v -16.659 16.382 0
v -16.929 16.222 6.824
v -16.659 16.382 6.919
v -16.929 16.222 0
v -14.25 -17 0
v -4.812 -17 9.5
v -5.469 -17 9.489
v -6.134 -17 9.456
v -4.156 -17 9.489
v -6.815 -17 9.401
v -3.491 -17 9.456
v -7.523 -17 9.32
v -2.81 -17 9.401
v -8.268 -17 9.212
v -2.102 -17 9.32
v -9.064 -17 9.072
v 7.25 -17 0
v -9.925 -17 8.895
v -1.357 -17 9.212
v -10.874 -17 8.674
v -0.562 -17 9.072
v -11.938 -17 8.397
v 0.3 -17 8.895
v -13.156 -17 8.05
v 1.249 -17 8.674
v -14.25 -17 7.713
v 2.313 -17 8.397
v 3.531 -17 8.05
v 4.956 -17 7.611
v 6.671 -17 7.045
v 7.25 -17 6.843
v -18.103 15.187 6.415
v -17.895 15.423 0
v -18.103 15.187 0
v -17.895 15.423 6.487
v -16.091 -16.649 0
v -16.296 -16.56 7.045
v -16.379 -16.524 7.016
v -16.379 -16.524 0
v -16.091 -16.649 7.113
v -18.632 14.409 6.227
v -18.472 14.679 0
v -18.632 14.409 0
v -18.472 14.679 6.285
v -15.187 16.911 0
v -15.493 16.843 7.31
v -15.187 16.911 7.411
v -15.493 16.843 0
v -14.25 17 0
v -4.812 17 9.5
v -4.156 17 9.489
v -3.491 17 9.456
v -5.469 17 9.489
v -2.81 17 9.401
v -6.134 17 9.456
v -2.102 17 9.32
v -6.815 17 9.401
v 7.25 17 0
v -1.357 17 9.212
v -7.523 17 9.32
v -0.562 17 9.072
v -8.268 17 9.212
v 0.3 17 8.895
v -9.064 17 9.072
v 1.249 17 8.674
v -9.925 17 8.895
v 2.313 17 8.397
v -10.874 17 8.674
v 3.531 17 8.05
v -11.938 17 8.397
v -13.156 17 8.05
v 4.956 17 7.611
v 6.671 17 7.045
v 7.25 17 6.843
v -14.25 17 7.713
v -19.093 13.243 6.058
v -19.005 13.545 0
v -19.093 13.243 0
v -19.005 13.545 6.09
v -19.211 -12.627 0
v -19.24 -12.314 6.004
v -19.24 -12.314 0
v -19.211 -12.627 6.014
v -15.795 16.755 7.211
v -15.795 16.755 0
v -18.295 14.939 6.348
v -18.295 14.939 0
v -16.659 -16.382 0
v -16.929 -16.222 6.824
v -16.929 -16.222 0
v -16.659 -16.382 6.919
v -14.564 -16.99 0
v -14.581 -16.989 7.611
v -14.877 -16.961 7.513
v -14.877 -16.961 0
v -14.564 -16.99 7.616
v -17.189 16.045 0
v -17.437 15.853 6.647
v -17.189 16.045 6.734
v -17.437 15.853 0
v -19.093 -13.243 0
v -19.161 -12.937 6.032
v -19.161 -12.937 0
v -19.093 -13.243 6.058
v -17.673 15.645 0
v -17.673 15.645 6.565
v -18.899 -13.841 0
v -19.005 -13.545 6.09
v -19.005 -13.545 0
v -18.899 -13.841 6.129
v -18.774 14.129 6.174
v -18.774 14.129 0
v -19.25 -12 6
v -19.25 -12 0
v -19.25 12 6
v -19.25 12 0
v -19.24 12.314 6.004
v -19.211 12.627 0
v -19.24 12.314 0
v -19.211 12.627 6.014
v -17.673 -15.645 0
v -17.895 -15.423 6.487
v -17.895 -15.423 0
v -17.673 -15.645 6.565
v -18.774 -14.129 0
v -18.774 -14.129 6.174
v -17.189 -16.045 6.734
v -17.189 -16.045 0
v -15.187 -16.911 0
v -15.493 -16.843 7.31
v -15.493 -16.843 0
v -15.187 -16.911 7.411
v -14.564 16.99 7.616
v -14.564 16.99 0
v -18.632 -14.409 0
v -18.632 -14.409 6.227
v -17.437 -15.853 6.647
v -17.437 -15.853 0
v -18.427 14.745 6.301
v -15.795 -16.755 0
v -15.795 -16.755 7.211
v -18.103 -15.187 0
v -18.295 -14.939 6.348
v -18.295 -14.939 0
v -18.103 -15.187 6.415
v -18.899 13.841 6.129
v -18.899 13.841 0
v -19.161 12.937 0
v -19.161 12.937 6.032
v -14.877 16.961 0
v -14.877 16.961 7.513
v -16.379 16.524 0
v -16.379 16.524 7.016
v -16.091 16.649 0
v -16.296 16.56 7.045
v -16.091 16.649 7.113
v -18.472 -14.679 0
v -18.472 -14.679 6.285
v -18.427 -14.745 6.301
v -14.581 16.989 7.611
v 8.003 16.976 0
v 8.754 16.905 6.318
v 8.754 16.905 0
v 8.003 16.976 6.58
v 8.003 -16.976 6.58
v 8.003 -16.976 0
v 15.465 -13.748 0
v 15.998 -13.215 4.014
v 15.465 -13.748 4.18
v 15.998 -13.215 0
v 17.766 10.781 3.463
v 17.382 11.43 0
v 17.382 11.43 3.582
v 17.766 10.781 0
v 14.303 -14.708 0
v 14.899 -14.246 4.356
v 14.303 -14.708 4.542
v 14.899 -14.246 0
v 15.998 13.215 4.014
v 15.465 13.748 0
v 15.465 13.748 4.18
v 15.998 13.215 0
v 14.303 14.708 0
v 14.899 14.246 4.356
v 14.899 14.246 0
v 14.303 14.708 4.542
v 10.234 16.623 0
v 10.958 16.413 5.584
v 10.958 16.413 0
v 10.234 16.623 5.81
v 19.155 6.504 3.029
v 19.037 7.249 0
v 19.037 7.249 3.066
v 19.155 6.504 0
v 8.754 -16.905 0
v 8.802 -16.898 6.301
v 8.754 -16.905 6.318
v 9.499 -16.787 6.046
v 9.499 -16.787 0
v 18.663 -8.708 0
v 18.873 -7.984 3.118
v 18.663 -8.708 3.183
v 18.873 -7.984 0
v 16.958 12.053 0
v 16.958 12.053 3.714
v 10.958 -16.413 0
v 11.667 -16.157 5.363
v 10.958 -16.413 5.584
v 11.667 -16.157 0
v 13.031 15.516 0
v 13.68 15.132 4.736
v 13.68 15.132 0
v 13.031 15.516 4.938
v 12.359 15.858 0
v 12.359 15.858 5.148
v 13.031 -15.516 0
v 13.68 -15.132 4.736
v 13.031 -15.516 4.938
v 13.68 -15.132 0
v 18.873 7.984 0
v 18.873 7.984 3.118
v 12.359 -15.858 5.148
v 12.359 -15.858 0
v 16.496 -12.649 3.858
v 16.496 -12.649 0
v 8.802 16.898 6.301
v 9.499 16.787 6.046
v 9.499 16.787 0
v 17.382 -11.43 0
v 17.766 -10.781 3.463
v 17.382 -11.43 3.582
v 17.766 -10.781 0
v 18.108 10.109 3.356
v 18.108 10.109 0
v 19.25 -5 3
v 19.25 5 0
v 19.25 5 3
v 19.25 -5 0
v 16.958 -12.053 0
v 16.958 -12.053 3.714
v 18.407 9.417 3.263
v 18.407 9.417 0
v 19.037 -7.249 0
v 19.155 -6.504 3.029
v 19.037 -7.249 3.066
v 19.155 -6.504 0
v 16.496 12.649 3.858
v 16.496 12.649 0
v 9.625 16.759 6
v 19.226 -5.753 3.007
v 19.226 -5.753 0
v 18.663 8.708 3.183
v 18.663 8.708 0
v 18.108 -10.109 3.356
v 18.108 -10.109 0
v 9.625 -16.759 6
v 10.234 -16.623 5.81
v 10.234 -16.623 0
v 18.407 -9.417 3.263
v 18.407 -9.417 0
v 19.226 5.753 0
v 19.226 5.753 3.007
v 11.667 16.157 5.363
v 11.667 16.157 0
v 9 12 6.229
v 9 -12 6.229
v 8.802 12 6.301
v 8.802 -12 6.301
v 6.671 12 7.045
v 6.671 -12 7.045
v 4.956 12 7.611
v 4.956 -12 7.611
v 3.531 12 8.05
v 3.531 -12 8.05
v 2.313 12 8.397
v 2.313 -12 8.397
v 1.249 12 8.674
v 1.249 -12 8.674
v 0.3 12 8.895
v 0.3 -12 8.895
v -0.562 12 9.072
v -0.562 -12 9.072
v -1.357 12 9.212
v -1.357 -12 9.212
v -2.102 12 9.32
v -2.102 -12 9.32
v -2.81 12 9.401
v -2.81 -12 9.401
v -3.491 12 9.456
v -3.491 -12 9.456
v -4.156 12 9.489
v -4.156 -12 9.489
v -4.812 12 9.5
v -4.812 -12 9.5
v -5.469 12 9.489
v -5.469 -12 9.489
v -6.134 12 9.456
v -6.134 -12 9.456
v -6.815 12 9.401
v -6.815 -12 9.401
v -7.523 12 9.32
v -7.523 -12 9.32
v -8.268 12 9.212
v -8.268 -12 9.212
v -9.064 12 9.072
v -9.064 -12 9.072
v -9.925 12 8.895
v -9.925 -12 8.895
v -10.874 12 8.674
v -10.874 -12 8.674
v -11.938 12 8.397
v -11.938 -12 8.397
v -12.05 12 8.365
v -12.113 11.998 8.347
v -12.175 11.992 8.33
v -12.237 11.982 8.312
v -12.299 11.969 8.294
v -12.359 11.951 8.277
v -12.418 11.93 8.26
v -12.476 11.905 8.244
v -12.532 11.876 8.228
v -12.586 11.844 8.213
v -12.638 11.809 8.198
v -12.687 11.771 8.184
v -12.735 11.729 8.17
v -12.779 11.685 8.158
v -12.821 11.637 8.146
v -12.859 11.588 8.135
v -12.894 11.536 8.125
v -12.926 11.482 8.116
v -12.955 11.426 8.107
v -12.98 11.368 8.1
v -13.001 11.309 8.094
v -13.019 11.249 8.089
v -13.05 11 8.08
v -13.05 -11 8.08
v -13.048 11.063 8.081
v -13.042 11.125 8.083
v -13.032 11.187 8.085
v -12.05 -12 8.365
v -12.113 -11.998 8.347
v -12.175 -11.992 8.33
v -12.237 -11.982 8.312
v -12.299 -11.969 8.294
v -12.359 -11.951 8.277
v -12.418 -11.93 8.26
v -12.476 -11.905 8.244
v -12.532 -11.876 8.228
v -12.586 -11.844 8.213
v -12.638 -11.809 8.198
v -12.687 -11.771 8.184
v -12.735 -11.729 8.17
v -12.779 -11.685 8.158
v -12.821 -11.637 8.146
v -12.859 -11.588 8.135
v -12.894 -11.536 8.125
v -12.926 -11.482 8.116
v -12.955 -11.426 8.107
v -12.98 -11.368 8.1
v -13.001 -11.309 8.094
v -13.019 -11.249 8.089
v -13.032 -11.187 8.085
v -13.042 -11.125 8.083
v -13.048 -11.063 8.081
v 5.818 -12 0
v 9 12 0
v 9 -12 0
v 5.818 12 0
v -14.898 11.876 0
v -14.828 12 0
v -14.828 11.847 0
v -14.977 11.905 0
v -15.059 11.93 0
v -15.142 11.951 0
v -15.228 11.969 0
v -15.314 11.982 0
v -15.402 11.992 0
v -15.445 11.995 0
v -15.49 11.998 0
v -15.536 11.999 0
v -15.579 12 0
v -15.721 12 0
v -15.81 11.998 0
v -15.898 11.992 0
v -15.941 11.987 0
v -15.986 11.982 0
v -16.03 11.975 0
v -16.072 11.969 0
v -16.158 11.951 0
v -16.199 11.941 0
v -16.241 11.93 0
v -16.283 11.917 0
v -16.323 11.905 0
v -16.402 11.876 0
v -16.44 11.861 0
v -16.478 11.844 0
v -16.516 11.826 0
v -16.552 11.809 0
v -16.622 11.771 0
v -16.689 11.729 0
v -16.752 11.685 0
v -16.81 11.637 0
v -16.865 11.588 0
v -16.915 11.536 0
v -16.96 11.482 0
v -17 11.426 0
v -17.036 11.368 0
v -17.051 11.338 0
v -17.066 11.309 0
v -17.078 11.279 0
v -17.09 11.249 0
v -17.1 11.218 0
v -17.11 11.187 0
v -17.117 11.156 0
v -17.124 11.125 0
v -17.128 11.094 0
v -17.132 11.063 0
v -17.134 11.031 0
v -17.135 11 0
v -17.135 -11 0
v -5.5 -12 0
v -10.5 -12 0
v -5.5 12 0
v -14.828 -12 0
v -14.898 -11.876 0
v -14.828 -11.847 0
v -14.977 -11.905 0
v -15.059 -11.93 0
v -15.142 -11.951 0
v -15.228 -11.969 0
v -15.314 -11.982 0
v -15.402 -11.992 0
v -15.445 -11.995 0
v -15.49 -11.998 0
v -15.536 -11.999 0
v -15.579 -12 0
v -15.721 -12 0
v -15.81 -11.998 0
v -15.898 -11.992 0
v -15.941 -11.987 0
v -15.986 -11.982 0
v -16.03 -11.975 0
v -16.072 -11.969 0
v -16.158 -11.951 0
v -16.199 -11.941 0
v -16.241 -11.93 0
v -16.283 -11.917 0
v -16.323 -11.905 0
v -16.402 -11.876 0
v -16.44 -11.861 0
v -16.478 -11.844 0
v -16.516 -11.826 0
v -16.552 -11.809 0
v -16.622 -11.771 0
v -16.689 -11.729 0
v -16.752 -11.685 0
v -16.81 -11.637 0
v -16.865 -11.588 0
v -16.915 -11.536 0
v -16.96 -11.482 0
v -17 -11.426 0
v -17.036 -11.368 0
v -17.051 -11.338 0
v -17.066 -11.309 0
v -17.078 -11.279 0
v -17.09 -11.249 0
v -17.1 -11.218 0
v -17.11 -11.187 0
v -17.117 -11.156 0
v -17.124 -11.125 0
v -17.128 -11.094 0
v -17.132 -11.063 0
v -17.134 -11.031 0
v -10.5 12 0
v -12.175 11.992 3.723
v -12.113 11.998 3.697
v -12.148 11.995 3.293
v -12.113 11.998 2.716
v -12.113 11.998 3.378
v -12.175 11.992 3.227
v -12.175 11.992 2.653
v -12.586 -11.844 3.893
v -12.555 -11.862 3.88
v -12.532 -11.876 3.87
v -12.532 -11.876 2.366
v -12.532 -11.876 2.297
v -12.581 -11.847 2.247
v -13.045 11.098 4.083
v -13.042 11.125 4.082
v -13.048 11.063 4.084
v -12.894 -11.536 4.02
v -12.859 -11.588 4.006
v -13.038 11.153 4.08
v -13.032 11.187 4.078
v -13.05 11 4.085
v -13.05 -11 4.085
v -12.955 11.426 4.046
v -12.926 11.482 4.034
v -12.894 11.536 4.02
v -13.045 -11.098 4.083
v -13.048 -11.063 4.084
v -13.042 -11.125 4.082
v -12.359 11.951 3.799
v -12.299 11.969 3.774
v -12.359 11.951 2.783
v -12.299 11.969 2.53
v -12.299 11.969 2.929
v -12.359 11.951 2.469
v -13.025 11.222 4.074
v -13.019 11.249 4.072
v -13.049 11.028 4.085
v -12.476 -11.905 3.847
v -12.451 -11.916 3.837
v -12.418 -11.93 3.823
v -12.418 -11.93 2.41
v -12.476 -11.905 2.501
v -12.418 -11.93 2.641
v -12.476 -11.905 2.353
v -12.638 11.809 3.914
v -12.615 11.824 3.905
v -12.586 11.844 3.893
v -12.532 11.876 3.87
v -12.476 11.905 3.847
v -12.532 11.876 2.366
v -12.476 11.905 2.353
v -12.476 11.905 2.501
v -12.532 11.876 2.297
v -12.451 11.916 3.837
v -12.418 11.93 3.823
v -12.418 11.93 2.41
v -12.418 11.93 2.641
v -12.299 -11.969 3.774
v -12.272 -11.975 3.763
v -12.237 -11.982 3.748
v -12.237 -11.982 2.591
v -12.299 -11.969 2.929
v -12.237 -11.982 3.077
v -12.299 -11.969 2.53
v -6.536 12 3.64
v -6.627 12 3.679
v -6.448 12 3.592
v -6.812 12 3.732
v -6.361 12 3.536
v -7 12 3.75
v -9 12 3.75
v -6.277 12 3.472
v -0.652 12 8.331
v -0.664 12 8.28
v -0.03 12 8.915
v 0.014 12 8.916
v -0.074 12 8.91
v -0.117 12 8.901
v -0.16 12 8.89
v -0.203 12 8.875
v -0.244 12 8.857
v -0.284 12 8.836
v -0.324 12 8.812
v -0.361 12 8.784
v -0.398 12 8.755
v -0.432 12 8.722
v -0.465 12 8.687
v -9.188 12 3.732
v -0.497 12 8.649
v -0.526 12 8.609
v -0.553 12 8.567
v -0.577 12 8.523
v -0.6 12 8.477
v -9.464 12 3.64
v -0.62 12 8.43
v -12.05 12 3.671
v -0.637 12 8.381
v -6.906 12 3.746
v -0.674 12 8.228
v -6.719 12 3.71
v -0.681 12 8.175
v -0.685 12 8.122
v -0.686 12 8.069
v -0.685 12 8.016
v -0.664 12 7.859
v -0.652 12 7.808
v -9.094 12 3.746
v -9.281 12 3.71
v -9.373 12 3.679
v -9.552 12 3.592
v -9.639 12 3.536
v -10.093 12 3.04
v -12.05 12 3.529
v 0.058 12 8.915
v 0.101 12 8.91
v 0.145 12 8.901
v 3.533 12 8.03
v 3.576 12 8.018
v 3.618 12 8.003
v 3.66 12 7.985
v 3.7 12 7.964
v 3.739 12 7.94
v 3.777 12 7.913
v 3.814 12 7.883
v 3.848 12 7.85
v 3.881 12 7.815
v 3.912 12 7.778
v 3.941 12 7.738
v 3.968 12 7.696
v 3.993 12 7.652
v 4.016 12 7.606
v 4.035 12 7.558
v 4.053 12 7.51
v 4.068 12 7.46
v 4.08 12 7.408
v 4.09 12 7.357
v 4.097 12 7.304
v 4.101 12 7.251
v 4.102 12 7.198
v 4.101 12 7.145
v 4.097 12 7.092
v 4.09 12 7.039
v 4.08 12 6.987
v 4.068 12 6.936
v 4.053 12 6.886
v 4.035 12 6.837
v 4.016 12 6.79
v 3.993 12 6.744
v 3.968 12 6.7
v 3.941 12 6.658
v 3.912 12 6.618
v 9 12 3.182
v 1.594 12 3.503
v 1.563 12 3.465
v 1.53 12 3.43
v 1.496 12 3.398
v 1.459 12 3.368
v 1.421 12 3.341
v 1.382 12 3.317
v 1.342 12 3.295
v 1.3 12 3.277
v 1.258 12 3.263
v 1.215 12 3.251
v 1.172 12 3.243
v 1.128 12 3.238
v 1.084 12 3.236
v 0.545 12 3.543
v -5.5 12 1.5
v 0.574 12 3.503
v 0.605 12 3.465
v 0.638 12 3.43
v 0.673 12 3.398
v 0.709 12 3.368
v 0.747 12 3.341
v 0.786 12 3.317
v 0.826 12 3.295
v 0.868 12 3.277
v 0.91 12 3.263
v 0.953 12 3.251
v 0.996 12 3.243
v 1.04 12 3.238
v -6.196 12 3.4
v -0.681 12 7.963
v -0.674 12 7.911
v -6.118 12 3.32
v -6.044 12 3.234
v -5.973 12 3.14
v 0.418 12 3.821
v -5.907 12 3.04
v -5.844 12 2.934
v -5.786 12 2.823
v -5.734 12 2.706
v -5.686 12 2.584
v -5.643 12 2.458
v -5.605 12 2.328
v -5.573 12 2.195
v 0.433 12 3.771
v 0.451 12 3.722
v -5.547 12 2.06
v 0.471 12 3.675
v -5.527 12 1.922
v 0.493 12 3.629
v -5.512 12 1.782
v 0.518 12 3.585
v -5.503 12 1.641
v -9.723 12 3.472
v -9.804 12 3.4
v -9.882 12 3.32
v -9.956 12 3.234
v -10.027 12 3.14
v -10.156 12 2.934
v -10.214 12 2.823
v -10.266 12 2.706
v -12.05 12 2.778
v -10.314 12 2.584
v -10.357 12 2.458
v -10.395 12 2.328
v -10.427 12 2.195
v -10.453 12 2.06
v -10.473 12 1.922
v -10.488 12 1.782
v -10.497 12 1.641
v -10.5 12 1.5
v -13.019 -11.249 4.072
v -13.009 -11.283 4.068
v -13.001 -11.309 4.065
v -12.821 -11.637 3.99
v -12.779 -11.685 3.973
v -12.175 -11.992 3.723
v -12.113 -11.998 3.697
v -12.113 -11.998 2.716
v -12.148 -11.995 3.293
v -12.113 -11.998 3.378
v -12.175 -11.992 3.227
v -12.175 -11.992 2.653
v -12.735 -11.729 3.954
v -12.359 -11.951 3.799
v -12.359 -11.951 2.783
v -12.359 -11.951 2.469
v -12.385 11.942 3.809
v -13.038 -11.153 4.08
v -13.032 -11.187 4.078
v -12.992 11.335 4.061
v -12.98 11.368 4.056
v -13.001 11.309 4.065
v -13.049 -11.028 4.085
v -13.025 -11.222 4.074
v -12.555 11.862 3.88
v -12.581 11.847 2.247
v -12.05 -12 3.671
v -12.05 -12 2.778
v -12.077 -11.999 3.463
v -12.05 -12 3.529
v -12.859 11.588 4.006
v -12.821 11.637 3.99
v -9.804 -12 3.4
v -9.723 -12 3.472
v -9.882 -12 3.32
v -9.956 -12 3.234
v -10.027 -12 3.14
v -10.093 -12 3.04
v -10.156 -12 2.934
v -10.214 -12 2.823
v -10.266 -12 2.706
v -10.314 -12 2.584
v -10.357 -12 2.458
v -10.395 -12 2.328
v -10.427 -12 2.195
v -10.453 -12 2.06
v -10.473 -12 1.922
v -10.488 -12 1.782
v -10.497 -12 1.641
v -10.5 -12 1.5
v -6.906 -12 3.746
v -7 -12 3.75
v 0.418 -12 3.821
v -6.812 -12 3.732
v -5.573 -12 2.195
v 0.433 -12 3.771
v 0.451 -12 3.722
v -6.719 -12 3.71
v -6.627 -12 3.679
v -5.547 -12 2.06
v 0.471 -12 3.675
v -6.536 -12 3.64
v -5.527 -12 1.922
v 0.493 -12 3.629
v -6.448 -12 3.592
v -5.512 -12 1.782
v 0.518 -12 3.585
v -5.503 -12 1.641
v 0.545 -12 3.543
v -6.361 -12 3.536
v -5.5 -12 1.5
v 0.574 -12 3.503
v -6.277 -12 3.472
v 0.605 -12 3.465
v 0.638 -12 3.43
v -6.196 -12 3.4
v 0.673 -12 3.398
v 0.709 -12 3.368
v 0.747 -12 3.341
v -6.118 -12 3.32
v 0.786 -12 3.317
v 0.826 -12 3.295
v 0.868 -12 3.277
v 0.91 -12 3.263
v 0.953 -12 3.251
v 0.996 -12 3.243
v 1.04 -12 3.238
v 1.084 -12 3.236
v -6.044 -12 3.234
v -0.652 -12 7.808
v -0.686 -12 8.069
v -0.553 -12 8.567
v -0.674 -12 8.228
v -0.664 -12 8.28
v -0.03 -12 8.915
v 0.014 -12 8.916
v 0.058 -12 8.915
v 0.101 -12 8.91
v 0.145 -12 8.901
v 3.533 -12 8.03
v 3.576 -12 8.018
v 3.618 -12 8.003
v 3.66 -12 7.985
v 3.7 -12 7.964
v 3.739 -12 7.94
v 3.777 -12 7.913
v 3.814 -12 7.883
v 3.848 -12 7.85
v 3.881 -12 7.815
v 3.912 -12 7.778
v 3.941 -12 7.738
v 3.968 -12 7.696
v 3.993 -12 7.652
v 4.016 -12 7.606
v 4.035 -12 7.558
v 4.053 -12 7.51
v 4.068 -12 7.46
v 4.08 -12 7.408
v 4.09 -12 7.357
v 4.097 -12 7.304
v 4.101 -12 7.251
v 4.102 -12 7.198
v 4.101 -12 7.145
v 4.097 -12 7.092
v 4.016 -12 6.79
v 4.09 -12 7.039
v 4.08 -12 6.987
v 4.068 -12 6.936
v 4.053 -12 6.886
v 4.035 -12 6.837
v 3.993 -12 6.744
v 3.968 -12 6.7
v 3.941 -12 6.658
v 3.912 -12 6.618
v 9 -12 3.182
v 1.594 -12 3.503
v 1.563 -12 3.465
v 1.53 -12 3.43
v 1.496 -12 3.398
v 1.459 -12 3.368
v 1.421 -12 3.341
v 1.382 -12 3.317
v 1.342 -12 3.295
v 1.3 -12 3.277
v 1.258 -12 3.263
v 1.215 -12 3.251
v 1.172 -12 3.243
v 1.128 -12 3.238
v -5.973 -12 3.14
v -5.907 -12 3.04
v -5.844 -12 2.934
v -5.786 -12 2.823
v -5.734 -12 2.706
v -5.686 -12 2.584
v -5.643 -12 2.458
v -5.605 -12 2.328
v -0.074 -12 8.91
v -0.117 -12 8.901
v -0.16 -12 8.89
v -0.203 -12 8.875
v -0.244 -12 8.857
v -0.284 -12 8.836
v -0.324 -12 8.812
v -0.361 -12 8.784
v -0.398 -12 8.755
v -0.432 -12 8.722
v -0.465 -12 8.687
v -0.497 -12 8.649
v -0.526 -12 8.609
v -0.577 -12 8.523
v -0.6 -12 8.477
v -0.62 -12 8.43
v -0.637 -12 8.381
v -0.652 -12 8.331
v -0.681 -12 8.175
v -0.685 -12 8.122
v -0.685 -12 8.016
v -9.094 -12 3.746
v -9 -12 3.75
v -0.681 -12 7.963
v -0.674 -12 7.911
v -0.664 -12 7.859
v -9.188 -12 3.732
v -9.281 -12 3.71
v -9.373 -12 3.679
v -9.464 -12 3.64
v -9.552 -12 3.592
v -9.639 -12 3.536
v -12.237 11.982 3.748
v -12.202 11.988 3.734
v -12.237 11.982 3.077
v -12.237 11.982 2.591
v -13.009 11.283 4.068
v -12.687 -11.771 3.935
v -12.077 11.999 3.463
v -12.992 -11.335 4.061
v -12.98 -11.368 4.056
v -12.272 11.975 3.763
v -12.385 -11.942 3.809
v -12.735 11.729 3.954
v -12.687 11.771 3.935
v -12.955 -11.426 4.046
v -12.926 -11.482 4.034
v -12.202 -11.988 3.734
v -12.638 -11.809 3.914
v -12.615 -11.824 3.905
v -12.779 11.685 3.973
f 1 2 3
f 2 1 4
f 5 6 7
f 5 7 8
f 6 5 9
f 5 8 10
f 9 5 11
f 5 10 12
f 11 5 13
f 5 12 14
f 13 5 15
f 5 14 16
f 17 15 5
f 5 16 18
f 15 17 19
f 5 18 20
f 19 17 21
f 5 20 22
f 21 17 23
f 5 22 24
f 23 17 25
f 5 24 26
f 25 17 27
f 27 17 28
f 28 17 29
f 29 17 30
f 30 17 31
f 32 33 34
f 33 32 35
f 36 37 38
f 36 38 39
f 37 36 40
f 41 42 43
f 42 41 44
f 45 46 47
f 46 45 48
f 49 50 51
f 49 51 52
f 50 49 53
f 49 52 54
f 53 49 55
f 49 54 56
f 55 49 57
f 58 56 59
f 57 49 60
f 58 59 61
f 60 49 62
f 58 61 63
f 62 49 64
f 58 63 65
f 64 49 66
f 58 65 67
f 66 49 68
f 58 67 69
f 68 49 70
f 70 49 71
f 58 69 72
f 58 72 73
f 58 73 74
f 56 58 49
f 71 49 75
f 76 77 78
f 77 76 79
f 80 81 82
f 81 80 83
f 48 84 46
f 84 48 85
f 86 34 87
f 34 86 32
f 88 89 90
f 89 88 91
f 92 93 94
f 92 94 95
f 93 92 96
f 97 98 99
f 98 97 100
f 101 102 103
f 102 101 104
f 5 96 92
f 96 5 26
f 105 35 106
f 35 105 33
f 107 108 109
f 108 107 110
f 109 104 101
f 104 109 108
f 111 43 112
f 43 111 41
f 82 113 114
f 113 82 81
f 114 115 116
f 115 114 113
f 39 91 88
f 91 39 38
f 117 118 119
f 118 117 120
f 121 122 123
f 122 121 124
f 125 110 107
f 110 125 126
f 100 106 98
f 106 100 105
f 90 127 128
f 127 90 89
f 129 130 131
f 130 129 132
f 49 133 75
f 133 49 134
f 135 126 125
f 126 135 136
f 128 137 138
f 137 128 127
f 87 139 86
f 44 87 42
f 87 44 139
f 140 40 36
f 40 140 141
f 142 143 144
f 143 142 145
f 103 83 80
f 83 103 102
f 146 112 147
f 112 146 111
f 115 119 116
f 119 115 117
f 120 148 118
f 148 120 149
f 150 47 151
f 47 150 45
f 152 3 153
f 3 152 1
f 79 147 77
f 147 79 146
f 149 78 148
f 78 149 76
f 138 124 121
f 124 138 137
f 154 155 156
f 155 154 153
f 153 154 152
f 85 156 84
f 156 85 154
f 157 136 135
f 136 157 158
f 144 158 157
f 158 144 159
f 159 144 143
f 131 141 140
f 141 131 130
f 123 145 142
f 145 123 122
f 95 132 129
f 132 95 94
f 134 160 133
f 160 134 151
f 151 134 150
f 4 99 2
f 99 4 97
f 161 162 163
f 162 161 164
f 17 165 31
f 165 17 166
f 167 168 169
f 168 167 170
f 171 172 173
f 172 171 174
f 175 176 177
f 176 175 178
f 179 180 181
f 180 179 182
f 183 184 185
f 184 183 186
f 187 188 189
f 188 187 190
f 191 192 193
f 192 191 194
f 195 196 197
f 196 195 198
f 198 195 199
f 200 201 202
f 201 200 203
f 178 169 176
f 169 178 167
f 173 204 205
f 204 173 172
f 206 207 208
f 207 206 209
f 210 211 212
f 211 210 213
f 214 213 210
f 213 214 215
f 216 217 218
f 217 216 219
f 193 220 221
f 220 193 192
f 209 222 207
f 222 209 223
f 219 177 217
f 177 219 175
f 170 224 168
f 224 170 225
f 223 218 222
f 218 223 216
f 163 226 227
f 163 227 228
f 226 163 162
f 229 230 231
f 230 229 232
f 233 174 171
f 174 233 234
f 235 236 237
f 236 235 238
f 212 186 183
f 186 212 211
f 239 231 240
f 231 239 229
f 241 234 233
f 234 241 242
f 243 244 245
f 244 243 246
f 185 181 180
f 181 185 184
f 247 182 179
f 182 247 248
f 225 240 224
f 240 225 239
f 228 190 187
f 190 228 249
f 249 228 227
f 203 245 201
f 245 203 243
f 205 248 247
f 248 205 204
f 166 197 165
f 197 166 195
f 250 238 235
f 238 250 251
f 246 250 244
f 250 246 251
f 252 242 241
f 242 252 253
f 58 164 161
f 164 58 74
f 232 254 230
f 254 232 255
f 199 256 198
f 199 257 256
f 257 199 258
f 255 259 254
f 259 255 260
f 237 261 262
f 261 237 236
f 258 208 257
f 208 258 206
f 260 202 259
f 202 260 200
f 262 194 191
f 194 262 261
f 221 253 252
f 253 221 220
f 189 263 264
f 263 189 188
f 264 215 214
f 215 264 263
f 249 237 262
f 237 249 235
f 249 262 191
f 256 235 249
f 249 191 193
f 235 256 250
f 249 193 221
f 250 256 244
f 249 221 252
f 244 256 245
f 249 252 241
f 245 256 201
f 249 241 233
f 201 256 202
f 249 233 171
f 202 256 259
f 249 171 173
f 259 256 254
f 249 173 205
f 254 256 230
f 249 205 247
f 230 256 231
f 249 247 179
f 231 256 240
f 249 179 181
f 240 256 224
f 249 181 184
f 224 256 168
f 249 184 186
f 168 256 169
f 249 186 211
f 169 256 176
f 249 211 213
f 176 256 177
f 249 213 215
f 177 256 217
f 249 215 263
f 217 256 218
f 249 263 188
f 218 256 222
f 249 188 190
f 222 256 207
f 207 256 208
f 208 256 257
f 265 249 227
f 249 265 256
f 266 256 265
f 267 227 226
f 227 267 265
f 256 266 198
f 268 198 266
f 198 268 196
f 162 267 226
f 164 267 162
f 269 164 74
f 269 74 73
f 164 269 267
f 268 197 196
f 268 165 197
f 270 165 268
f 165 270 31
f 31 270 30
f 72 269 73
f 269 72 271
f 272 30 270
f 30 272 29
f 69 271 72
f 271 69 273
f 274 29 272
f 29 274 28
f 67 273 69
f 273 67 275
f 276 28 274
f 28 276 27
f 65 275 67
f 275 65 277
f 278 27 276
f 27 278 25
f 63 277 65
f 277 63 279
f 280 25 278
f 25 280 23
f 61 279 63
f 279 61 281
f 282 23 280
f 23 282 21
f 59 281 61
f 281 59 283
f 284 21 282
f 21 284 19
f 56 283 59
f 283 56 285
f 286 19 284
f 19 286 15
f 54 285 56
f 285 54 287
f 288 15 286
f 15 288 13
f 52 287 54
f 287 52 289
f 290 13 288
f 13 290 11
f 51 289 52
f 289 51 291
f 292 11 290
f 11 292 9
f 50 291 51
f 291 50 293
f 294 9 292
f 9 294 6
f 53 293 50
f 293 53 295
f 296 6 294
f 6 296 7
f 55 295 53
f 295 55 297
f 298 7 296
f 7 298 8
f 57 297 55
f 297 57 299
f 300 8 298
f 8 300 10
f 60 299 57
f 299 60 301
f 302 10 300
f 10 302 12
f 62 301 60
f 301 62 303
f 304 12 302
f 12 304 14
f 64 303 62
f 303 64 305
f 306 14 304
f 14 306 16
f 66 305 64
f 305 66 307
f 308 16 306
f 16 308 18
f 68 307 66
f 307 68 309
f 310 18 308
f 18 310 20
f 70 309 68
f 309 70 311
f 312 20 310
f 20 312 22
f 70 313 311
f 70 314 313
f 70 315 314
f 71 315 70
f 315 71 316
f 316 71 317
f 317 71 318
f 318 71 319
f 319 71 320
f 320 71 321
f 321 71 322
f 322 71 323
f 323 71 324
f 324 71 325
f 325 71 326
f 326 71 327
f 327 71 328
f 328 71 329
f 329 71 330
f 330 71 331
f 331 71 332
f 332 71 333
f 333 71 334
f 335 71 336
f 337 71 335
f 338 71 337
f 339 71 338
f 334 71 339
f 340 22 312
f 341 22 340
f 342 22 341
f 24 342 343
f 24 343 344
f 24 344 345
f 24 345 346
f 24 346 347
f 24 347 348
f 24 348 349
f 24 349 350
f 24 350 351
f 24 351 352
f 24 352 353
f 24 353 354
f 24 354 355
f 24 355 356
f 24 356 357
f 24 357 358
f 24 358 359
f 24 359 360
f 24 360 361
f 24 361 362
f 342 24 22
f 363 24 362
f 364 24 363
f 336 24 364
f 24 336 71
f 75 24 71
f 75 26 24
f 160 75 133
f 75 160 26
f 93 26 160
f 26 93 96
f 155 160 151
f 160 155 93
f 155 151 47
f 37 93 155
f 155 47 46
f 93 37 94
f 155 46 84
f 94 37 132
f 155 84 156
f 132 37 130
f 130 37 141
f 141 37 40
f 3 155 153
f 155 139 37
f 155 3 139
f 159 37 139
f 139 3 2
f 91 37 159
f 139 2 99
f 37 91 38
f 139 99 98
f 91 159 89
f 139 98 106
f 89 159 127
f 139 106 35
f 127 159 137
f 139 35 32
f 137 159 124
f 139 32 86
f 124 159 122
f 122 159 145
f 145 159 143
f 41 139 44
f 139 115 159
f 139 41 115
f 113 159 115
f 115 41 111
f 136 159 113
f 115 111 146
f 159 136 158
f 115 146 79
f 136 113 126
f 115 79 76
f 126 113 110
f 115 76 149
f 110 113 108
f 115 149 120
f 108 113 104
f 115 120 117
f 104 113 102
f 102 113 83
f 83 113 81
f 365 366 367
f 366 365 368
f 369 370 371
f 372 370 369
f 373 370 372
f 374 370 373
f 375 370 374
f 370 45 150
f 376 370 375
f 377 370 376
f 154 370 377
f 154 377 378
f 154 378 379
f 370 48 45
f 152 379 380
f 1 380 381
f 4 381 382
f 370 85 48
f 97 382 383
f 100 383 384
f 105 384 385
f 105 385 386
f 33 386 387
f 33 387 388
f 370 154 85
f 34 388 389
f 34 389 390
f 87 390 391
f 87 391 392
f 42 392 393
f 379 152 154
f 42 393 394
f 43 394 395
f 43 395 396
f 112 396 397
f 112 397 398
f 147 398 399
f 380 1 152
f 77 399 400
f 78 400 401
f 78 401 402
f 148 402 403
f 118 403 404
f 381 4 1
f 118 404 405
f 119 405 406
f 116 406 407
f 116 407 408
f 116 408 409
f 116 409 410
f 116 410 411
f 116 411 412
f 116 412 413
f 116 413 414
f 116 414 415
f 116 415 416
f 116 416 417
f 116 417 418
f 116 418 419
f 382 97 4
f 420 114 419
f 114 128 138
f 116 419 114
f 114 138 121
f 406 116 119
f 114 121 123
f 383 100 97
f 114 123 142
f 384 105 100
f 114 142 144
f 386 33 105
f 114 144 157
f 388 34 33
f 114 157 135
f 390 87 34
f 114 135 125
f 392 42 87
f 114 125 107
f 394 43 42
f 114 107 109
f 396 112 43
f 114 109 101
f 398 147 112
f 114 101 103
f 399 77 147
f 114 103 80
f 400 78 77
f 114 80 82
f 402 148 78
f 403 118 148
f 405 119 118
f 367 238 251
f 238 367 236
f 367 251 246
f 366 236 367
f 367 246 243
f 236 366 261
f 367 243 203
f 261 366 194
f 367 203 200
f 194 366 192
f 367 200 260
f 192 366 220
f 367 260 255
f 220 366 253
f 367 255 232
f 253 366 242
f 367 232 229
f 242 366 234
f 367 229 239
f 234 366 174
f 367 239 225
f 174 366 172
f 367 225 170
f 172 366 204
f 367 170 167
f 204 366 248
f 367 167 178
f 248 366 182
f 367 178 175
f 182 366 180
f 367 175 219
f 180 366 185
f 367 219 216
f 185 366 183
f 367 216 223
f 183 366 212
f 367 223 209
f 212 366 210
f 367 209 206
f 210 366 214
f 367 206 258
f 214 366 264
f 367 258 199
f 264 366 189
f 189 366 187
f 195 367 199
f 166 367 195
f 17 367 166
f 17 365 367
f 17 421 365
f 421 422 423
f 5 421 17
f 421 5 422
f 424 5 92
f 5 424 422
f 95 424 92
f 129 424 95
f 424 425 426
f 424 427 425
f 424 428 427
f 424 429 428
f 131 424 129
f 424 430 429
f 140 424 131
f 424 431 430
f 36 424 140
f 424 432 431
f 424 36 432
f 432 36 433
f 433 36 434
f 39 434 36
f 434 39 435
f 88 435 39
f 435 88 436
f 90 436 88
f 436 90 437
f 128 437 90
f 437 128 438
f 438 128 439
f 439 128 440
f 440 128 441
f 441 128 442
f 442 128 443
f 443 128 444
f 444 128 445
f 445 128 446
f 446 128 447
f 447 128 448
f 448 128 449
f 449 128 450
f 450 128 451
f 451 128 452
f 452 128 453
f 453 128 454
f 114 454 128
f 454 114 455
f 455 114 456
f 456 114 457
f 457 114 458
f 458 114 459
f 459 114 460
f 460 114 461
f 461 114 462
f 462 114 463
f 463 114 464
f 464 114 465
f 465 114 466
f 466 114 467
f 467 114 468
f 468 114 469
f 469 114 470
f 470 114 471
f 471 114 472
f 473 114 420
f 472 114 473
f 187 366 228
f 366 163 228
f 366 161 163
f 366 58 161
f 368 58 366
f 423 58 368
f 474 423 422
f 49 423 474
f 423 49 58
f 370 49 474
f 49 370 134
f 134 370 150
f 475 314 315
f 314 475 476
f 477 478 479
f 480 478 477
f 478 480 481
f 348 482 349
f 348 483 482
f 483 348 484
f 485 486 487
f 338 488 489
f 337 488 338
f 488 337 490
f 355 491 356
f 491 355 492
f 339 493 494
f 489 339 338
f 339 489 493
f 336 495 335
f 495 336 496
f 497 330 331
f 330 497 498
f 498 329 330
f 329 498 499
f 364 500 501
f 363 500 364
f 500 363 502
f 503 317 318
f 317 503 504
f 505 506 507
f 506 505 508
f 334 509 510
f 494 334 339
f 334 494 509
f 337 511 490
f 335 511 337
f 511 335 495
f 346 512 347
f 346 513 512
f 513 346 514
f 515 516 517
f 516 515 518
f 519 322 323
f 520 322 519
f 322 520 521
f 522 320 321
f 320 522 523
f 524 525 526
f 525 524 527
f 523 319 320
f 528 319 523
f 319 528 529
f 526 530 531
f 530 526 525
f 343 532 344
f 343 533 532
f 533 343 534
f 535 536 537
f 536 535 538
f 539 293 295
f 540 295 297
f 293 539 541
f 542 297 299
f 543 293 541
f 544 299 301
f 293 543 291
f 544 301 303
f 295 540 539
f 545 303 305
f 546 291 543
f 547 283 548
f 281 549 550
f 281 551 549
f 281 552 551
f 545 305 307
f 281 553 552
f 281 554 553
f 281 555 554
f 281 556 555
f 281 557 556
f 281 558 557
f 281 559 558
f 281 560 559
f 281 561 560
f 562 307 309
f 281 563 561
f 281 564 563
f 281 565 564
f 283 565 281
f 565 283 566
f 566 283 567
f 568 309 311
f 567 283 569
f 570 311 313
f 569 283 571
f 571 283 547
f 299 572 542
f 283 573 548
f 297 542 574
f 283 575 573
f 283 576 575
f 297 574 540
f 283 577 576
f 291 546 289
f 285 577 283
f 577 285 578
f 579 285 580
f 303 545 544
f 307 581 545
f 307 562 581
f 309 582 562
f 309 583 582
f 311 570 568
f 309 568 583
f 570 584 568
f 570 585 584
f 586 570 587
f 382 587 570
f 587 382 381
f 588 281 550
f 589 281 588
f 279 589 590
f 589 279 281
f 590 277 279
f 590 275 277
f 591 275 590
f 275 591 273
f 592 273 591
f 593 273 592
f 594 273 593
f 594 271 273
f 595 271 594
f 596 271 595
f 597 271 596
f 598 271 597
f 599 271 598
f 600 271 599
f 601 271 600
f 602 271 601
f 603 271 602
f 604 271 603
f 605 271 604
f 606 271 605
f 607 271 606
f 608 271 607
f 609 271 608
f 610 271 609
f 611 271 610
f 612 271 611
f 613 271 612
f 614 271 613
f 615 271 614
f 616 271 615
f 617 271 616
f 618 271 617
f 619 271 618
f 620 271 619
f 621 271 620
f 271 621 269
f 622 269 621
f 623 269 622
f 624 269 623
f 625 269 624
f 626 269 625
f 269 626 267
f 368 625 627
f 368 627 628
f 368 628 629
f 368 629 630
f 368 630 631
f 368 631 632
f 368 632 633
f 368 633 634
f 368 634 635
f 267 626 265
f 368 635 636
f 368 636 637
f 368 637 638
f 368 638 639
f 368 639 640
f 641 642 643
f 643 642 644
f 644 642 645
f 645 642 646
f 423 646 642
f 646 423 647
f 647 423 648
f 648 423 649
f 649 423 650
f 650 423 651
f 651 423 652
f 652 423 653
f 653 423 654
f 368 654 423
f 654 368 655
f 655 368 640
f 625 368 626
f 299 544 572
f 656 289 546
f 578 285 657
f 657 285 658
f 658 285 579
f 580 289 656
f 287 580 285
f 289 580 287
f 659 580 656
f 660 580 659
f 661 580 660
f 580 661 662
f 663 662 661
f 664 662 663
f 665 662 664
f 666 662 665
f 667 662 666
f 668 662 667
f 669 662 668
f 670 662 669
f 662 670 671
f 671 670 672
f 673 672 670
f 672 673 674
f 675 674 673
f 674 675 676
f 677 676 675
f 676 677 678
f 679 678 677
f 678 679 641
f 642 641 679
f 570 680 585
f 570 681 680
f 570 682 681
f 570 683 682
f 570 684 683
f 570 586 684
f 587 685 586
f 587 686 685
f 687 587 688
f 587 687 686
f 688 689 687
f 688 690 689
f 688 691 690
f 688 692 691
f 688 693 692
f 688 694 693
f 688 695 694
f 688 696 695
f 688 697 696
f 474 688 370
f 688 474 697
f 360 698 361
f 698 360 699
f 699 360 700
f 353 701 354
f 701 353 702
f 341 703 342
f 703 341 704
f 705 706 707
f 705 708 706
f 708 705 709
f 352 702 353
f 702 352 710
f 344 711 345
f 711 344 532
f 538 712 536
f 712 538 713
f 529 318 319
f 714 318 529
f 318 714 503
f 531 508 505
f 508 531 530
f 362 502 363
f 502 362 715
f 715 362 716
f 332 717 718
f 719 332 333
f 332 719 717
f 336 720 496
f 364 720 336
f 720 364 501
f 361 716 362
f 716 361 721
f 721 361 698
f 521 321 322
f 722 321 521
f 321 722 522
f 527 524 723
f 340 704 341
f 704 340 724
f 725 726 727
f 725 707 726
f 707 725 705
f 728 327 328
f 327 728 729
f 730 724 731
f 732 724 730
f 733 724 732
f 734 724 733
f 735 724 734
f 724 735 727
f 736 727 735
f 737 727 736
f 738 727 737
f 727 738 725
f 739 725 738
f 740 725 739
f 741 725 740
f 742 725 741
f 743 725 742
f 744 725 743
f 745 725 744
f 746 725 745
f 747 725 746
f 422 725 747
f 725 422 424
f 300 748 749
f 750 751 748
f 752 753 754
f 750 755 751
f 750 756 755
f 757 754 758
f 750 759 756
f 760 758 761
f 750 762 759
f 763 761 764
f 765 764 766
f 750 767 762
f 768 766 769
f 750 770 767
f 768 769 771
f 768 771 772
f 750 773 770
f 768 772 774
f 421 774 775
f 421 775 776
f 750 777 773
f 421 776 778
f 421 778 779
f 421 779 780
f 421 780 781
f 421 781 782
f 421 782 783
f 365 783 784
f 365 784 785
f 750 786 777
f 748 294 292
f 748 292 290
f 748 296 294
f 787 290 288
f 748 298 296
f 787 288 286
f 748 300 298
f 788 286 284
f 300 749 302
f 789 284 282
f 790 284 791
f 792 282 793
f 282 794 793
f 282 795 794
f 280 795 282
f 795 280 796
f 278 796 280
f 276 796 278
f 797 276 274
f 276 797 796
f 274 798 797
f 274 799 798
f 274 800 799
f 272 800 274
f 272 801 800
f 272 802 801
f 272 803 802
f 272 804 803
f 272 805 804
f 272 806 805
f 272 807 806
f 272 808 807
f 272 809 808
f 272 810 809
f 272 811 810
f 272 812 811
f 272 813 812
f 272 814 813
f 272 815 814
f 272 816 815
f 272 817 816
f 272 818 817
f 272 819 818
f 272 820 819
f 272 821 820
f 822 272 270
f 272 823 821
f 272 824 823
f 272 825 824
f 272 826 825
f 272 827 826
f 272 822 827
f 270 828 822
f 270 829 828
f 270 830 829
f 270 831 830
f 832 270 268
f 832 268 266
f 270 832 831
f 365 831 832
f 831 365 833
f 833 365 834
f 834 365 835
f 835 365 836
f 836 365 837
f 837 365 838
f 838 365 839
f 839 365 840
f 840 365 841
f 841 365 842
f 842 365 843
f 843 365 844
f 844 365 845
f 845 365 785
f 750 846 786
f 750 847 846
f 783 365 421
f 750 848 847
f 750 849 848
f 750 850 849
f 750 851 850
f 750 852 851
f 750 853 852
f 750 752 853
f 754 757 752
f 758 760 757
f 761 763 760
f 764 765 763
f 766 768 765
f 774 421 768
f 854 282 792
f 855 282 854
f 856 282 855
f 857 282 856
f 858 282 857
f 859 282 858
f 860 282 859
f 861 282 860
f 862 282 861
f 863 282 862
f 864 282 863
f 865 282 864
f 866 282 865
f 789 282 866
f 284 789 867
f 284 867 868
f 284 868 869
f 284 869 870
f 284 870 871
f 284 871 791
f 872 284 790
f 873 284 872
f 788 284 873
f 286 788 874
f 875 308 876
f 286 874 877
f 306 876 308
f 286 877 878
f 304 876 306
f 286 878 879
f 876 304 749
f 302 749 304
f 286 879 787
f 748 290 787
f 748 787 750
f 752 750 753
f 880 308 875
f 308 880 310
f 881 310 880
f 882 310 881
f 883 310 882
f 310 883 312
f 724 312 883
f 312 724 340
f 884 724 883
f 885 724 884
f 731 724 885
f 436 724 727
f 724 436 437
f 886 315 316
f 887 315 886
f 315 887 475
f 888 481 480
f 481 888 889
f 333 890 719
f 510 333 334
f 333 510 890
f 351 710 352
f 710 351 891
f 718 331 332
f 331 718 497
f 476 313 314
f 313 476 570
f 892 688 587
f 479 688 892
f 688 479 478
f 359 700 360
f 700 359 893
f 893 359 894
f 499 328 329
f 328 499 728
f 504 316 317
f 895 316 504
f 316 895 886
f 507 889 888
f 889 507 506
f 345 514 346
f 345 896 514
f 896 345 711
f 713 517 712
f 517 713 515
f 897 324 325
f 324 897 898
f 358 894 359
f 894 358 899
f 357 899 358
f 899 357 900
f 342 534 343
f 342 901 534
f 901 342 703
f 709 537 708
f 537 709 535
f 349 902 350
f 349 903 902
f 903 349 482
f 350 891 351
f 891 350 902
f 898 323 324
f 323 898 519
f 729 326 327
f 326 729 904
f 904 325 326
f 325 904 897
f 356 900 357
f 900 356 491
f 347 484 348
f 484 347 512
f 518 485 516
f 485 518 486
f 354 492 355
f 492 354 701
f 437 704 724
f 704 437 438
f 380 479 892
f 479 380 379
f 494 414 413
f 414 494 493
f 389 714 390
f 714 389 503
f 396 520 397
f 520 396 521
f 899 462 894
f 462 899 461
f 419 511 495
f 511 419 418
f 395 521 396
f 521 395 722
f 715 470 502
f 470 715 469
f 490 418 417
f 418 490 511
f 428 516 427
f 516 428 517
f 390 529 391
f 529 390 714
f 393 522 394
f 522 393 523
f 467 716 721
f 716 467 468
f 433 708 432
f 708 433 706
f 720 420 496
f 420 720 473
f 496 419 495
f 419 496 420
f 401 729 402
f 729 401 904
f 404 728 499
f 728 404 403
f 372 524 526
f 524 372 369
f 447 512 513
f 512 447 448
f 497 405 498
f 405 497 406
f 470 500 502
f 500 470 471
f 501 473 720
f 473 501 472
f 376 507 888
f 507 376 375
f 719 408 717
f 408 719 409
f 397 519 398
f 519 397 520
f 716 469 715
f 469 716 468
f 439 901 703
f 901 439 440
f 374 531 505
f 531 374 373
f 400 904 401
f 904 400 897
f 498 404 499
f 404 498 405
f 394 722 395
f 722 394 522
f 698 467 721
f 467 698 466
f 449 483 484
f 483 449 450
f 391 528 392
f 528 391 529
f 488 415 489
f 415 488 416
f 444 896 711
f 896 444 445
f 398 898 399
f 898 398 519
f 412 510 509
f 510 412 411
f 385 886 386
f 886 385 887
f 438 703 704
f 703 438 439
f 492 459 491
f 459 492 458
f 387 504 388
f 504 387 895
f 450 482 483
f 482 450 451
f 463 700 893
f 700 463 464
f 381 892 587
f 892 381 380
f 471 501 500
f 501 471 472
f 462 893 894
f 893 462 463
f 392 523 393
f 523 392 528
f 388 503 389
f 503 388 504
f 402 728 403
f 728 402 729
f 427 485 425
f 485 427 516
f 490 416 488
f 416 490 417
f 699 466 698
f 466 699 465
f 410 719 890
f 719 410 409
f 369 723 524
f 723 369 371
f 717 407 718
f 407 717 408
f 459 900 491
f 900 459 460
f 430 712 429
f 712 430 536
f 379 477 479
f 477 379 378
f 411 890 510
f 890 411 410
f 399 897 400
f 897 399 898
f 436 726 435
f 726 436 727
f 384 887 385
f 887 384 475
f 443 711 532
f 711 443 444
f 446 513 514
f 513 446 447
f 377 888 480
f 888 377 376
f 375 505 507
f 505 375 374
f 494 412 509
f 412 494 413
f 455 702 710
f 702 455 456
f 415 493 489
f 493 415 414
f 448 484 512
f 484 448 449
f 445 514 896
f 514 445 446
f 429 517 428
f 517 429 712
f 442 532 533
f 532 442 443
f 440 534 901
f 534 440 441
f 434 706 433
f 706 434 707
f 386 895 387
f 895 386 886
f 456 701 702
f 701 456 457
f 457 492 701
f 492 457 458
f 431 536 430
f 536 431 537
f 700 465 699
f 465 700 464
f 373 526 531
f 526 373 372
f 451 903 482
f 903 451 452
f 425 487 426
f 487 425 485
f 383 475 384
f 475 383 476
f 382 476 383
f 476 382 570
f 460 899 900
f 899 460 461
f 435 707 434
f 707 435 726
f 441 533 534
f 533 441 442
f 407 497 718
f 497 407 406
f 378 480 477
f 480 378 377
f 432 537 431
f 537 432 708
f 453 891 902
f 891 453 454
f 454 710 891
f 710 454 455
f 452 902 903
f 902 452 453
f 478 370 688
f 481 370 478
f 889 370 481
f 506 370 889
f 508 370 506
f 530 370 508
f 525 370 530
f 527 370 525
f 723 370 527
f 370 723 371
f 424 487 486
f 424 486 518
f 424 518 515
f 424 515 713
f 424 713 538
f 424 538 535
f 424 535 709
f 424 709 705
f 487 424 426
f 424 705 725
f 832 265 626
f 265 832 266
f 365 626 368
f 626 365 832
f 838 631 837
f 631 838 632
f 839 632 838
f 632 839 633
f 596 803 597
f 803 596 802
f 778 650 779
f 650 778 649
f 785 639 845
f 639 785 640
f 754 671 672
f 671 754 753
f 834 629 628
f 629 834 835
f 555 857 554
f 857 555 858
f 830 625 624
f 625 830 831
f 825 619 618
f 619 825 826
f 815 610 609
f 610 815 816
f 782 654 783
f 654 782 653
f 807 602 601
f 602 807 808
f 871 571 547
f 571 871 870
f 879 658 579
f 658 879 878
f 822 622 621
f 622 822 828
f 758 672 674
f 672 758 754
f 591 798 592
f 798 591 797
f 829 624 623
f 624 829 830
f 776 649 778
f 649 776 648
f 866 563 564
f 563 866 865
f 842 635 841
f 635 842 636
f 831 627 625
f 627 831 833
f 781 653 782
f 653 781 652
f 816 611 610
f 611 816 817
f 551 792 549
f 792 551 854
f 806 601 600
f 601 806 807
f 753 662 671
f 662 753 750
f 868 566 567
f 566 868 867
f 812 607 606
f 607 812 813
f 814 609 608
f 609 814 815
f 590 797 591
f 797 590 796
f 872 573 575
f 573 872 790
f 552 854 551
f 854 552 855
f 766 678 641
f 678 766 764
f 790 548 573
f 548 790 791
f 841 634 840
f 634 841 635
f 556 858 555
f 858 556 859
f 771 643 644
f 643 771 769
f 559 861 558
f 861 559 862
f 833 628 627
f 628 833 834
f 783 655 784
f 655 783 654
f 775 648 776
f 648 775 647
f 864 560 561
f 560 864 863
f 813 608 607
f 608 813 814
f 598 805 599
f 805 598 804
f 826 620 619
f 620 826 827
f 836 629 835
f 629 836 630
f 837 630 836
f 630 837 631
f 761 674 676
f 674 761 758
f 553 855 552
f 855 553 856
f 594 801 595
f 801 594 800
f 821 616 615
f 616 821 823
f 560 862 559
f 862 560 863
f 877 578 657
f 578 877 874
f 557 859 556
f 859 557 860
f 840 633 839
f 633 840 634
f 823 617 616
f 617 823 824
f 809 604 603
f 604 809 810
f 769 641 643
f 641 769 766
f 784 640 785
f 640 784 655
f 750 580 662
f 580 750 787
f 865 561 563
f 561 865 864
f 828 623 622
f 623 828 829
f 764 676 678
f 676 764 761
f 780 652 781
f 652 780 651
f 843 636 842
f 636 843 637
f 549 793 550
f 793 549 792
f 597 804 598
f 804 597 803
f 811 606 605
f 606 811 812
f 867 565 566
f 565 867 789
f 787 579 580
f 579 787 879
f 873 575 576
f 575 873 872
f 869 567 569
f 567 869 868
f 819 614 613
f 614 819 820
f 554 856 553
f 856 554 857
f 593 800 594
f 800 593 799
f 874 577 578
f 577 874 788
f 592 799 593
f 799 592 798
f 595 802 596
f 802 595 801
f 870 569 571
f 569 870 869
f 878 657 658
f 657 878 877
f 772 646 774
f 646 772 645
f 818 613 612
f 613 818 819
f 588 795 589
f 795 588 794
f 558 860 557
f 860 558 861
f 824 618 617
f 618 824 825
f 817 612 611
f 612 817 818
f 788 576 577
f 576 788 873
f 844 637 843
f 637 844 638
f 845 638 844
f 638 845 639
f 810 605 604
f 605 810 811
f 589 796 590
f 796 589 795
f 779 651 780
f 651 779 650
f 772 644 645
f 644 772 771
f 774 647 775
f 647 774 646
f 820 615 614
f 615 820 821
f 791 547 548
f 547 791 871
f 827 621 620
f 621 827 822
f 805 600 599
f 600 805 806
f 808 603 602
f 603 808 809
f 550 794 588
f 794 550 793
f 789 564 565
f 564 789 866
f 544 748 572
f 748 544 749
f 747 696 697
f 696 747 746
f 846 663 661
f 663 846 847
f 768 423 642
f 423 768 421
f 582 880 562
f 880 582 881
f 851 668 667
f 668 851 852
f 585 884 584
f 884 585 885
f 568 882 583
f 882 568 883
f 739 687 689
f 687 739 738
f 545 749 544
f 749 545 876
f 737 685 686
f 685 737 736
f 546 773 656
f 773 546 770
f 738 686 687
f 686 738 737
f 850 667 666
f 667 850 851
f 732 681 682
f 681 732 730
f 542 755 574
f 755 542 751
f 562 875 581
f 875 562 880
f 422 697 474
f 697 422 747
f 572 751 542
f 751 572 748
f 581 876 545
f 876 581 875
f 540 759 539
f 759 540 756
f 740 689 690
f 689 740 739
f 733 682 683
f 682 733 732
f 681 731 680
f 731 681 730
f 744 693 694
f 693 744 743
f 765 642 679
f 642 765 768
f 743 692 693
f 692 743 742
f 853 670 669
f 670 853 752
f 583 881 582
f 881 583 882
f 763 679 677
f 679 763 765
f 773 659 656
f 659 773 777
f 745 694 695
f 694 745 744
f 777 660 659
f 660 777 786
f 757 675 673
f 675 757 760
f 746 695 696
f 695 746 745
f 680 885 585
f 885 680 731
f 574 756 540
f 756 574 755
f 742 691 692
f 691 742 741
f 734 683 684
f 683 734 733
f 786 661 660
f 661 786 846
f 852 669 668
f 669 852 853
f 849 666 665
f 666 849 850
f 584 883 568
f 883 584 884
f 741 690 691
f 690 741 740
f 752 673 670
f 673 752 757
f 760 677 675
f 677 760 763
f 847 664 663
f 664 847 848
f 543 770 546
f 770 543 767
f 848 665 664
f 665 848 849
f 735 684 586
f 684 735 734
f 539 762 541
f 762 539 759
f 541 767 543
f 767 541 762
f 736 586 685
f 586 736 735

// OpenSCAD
module perfil(){
    lonX=38.5;
lonZ=9.5;
  parA=3;
    fac=0.5;
    
    translate([(lonX*(3/4))/2,6])
    resize([lonX*(3/4),lonZ-6])
    rotate(180)
   projection(cut=true)
      translate([0, 0,-parA*fac])
        rotate([90,0,0])
    rotate_extrude($fn = 80)
            polygon( points=[[0,0],[parA,0],[0,parA]] );
     
    polygon([[0,0], 
    [0,6],[lonX*(3/4),6],
    [lonX,3],[lonX,0]]);
}

module RemixStrap(EspInt=34){

esp=5;

lonY=EspInt+(2*esp);
lonX=38.5;
lonZ=9.5;
    
    extFront=9;//limite extremo Frontal

    difference(){
        translate([-lonX/2,lonY/2,0])
        
        
        
        //scale([reEscala,reEscala,reEscala])
        resize([lonX,lonY,lonZ])
        rotate([90,0,0])
        linear_extrude(height=lonY)
        //import("Perfil.dxf");
        perfil();

        recortadorMink(
        lonX=lonX,
        mink1=5,
        mink2=12,
        esp=esp,
         EspInt=EspInt
        );
        
        //recorte fondo
        translate([-12,0,0])
        minkowski(){
            mink0=1;
            cube([0.1,EspInt-(2*mink0),100],center=true);
            cylinder(r=mink0,h=0.1);     
        }
        
        //recorte en Angulo
        translate([-16.65,0,-1])
        rotate([0,45,0])
        minkowski(){
            mink0=1;
            cube([0.1,EspInt-(2*mink0),100],center=true);
            cylinder(r=mink0,h=0.1);     
        }
        
        extPost=12;//limite extremo Posterior
        
        //recorte excedente 2 minkowki
        translate([-extPost,0,0])
        rotate([0,45,0])
         cube([4,EspInt,4],center=true);
        
         //recorte primeraMitad
        translate([-extPost,-EspInt/2,0])
         cube([extPost,EspInt,100]);
         
         //recorte segundaMitad
        translate([-1,-EspInt/2,0])
         cube([extFront+1,EspInt,100]);
    }
    
    //rampaFrontal
        translate([extFront,0,0])
    difference(){
        rotate([0,45,0])
         cube([4.5,EspInt,4.5],center=true);
        translate([0,0,-50])
        cube([100,100,100],center=true);
    }
    
    //poste triangular
    translate([1.5,-EspInt/2-1,6.45])
    scale([1,1,1.21])
    rotate([-90,-18,0])
    linear_extrude(height=EspInt+2)
    minkowski(){
       //cylinder(d=3,h=EspInt+2,center=true);
        circle(d=4,$fn=3);
        circle(r=0.7);
    }
    
    translate([-8,-EspInt/2-1,0])
    scale([1,1,1.5])
    rotate([-90,0,0])
    linear_extrude(height=EspInt+2)
    difference(){
         minkowski(){
           //cylinder(d=3,h=EspInt+2,center=true);
            square([2,2],center=true);
            circle(r=1.5);
        }
        translate([0,4])
        square([8,8],center=true);
    }
}//fin module



module recortadorMink(
lonX=38.5,
mink1=10,
mink2=15,
esp=5,
EspInt=34
){   
    
    lonY=EspInt+(2*esp);
    difference(){
      cube([100,100,100],center=true);
        //translate([-6.1,0,0])
        
        //redondeo chico
        intersection(){
             minkowski(){
                  cube([lonX-(2*mink1),lonY-(2*mink1),200],center=true);
                cylinder(r=mink1,h=0.1);
            }
            translate([-50,0,0])
            cube([100,100,200],center=true);
        }
        //redondeo grande
         intersection(){
             minkowski(){
                  cube([lonX-(2*mink2),lonY-(2*mink2),200],center=true);
                cylinder(r=mink2,h=0.1);
            }
            translate([50,0,0])
            cube([100,100,200],center=true);
        }
      
   }//fin difference
}//fin module

$fn=100;

RemixStrap(EspInt=24);
